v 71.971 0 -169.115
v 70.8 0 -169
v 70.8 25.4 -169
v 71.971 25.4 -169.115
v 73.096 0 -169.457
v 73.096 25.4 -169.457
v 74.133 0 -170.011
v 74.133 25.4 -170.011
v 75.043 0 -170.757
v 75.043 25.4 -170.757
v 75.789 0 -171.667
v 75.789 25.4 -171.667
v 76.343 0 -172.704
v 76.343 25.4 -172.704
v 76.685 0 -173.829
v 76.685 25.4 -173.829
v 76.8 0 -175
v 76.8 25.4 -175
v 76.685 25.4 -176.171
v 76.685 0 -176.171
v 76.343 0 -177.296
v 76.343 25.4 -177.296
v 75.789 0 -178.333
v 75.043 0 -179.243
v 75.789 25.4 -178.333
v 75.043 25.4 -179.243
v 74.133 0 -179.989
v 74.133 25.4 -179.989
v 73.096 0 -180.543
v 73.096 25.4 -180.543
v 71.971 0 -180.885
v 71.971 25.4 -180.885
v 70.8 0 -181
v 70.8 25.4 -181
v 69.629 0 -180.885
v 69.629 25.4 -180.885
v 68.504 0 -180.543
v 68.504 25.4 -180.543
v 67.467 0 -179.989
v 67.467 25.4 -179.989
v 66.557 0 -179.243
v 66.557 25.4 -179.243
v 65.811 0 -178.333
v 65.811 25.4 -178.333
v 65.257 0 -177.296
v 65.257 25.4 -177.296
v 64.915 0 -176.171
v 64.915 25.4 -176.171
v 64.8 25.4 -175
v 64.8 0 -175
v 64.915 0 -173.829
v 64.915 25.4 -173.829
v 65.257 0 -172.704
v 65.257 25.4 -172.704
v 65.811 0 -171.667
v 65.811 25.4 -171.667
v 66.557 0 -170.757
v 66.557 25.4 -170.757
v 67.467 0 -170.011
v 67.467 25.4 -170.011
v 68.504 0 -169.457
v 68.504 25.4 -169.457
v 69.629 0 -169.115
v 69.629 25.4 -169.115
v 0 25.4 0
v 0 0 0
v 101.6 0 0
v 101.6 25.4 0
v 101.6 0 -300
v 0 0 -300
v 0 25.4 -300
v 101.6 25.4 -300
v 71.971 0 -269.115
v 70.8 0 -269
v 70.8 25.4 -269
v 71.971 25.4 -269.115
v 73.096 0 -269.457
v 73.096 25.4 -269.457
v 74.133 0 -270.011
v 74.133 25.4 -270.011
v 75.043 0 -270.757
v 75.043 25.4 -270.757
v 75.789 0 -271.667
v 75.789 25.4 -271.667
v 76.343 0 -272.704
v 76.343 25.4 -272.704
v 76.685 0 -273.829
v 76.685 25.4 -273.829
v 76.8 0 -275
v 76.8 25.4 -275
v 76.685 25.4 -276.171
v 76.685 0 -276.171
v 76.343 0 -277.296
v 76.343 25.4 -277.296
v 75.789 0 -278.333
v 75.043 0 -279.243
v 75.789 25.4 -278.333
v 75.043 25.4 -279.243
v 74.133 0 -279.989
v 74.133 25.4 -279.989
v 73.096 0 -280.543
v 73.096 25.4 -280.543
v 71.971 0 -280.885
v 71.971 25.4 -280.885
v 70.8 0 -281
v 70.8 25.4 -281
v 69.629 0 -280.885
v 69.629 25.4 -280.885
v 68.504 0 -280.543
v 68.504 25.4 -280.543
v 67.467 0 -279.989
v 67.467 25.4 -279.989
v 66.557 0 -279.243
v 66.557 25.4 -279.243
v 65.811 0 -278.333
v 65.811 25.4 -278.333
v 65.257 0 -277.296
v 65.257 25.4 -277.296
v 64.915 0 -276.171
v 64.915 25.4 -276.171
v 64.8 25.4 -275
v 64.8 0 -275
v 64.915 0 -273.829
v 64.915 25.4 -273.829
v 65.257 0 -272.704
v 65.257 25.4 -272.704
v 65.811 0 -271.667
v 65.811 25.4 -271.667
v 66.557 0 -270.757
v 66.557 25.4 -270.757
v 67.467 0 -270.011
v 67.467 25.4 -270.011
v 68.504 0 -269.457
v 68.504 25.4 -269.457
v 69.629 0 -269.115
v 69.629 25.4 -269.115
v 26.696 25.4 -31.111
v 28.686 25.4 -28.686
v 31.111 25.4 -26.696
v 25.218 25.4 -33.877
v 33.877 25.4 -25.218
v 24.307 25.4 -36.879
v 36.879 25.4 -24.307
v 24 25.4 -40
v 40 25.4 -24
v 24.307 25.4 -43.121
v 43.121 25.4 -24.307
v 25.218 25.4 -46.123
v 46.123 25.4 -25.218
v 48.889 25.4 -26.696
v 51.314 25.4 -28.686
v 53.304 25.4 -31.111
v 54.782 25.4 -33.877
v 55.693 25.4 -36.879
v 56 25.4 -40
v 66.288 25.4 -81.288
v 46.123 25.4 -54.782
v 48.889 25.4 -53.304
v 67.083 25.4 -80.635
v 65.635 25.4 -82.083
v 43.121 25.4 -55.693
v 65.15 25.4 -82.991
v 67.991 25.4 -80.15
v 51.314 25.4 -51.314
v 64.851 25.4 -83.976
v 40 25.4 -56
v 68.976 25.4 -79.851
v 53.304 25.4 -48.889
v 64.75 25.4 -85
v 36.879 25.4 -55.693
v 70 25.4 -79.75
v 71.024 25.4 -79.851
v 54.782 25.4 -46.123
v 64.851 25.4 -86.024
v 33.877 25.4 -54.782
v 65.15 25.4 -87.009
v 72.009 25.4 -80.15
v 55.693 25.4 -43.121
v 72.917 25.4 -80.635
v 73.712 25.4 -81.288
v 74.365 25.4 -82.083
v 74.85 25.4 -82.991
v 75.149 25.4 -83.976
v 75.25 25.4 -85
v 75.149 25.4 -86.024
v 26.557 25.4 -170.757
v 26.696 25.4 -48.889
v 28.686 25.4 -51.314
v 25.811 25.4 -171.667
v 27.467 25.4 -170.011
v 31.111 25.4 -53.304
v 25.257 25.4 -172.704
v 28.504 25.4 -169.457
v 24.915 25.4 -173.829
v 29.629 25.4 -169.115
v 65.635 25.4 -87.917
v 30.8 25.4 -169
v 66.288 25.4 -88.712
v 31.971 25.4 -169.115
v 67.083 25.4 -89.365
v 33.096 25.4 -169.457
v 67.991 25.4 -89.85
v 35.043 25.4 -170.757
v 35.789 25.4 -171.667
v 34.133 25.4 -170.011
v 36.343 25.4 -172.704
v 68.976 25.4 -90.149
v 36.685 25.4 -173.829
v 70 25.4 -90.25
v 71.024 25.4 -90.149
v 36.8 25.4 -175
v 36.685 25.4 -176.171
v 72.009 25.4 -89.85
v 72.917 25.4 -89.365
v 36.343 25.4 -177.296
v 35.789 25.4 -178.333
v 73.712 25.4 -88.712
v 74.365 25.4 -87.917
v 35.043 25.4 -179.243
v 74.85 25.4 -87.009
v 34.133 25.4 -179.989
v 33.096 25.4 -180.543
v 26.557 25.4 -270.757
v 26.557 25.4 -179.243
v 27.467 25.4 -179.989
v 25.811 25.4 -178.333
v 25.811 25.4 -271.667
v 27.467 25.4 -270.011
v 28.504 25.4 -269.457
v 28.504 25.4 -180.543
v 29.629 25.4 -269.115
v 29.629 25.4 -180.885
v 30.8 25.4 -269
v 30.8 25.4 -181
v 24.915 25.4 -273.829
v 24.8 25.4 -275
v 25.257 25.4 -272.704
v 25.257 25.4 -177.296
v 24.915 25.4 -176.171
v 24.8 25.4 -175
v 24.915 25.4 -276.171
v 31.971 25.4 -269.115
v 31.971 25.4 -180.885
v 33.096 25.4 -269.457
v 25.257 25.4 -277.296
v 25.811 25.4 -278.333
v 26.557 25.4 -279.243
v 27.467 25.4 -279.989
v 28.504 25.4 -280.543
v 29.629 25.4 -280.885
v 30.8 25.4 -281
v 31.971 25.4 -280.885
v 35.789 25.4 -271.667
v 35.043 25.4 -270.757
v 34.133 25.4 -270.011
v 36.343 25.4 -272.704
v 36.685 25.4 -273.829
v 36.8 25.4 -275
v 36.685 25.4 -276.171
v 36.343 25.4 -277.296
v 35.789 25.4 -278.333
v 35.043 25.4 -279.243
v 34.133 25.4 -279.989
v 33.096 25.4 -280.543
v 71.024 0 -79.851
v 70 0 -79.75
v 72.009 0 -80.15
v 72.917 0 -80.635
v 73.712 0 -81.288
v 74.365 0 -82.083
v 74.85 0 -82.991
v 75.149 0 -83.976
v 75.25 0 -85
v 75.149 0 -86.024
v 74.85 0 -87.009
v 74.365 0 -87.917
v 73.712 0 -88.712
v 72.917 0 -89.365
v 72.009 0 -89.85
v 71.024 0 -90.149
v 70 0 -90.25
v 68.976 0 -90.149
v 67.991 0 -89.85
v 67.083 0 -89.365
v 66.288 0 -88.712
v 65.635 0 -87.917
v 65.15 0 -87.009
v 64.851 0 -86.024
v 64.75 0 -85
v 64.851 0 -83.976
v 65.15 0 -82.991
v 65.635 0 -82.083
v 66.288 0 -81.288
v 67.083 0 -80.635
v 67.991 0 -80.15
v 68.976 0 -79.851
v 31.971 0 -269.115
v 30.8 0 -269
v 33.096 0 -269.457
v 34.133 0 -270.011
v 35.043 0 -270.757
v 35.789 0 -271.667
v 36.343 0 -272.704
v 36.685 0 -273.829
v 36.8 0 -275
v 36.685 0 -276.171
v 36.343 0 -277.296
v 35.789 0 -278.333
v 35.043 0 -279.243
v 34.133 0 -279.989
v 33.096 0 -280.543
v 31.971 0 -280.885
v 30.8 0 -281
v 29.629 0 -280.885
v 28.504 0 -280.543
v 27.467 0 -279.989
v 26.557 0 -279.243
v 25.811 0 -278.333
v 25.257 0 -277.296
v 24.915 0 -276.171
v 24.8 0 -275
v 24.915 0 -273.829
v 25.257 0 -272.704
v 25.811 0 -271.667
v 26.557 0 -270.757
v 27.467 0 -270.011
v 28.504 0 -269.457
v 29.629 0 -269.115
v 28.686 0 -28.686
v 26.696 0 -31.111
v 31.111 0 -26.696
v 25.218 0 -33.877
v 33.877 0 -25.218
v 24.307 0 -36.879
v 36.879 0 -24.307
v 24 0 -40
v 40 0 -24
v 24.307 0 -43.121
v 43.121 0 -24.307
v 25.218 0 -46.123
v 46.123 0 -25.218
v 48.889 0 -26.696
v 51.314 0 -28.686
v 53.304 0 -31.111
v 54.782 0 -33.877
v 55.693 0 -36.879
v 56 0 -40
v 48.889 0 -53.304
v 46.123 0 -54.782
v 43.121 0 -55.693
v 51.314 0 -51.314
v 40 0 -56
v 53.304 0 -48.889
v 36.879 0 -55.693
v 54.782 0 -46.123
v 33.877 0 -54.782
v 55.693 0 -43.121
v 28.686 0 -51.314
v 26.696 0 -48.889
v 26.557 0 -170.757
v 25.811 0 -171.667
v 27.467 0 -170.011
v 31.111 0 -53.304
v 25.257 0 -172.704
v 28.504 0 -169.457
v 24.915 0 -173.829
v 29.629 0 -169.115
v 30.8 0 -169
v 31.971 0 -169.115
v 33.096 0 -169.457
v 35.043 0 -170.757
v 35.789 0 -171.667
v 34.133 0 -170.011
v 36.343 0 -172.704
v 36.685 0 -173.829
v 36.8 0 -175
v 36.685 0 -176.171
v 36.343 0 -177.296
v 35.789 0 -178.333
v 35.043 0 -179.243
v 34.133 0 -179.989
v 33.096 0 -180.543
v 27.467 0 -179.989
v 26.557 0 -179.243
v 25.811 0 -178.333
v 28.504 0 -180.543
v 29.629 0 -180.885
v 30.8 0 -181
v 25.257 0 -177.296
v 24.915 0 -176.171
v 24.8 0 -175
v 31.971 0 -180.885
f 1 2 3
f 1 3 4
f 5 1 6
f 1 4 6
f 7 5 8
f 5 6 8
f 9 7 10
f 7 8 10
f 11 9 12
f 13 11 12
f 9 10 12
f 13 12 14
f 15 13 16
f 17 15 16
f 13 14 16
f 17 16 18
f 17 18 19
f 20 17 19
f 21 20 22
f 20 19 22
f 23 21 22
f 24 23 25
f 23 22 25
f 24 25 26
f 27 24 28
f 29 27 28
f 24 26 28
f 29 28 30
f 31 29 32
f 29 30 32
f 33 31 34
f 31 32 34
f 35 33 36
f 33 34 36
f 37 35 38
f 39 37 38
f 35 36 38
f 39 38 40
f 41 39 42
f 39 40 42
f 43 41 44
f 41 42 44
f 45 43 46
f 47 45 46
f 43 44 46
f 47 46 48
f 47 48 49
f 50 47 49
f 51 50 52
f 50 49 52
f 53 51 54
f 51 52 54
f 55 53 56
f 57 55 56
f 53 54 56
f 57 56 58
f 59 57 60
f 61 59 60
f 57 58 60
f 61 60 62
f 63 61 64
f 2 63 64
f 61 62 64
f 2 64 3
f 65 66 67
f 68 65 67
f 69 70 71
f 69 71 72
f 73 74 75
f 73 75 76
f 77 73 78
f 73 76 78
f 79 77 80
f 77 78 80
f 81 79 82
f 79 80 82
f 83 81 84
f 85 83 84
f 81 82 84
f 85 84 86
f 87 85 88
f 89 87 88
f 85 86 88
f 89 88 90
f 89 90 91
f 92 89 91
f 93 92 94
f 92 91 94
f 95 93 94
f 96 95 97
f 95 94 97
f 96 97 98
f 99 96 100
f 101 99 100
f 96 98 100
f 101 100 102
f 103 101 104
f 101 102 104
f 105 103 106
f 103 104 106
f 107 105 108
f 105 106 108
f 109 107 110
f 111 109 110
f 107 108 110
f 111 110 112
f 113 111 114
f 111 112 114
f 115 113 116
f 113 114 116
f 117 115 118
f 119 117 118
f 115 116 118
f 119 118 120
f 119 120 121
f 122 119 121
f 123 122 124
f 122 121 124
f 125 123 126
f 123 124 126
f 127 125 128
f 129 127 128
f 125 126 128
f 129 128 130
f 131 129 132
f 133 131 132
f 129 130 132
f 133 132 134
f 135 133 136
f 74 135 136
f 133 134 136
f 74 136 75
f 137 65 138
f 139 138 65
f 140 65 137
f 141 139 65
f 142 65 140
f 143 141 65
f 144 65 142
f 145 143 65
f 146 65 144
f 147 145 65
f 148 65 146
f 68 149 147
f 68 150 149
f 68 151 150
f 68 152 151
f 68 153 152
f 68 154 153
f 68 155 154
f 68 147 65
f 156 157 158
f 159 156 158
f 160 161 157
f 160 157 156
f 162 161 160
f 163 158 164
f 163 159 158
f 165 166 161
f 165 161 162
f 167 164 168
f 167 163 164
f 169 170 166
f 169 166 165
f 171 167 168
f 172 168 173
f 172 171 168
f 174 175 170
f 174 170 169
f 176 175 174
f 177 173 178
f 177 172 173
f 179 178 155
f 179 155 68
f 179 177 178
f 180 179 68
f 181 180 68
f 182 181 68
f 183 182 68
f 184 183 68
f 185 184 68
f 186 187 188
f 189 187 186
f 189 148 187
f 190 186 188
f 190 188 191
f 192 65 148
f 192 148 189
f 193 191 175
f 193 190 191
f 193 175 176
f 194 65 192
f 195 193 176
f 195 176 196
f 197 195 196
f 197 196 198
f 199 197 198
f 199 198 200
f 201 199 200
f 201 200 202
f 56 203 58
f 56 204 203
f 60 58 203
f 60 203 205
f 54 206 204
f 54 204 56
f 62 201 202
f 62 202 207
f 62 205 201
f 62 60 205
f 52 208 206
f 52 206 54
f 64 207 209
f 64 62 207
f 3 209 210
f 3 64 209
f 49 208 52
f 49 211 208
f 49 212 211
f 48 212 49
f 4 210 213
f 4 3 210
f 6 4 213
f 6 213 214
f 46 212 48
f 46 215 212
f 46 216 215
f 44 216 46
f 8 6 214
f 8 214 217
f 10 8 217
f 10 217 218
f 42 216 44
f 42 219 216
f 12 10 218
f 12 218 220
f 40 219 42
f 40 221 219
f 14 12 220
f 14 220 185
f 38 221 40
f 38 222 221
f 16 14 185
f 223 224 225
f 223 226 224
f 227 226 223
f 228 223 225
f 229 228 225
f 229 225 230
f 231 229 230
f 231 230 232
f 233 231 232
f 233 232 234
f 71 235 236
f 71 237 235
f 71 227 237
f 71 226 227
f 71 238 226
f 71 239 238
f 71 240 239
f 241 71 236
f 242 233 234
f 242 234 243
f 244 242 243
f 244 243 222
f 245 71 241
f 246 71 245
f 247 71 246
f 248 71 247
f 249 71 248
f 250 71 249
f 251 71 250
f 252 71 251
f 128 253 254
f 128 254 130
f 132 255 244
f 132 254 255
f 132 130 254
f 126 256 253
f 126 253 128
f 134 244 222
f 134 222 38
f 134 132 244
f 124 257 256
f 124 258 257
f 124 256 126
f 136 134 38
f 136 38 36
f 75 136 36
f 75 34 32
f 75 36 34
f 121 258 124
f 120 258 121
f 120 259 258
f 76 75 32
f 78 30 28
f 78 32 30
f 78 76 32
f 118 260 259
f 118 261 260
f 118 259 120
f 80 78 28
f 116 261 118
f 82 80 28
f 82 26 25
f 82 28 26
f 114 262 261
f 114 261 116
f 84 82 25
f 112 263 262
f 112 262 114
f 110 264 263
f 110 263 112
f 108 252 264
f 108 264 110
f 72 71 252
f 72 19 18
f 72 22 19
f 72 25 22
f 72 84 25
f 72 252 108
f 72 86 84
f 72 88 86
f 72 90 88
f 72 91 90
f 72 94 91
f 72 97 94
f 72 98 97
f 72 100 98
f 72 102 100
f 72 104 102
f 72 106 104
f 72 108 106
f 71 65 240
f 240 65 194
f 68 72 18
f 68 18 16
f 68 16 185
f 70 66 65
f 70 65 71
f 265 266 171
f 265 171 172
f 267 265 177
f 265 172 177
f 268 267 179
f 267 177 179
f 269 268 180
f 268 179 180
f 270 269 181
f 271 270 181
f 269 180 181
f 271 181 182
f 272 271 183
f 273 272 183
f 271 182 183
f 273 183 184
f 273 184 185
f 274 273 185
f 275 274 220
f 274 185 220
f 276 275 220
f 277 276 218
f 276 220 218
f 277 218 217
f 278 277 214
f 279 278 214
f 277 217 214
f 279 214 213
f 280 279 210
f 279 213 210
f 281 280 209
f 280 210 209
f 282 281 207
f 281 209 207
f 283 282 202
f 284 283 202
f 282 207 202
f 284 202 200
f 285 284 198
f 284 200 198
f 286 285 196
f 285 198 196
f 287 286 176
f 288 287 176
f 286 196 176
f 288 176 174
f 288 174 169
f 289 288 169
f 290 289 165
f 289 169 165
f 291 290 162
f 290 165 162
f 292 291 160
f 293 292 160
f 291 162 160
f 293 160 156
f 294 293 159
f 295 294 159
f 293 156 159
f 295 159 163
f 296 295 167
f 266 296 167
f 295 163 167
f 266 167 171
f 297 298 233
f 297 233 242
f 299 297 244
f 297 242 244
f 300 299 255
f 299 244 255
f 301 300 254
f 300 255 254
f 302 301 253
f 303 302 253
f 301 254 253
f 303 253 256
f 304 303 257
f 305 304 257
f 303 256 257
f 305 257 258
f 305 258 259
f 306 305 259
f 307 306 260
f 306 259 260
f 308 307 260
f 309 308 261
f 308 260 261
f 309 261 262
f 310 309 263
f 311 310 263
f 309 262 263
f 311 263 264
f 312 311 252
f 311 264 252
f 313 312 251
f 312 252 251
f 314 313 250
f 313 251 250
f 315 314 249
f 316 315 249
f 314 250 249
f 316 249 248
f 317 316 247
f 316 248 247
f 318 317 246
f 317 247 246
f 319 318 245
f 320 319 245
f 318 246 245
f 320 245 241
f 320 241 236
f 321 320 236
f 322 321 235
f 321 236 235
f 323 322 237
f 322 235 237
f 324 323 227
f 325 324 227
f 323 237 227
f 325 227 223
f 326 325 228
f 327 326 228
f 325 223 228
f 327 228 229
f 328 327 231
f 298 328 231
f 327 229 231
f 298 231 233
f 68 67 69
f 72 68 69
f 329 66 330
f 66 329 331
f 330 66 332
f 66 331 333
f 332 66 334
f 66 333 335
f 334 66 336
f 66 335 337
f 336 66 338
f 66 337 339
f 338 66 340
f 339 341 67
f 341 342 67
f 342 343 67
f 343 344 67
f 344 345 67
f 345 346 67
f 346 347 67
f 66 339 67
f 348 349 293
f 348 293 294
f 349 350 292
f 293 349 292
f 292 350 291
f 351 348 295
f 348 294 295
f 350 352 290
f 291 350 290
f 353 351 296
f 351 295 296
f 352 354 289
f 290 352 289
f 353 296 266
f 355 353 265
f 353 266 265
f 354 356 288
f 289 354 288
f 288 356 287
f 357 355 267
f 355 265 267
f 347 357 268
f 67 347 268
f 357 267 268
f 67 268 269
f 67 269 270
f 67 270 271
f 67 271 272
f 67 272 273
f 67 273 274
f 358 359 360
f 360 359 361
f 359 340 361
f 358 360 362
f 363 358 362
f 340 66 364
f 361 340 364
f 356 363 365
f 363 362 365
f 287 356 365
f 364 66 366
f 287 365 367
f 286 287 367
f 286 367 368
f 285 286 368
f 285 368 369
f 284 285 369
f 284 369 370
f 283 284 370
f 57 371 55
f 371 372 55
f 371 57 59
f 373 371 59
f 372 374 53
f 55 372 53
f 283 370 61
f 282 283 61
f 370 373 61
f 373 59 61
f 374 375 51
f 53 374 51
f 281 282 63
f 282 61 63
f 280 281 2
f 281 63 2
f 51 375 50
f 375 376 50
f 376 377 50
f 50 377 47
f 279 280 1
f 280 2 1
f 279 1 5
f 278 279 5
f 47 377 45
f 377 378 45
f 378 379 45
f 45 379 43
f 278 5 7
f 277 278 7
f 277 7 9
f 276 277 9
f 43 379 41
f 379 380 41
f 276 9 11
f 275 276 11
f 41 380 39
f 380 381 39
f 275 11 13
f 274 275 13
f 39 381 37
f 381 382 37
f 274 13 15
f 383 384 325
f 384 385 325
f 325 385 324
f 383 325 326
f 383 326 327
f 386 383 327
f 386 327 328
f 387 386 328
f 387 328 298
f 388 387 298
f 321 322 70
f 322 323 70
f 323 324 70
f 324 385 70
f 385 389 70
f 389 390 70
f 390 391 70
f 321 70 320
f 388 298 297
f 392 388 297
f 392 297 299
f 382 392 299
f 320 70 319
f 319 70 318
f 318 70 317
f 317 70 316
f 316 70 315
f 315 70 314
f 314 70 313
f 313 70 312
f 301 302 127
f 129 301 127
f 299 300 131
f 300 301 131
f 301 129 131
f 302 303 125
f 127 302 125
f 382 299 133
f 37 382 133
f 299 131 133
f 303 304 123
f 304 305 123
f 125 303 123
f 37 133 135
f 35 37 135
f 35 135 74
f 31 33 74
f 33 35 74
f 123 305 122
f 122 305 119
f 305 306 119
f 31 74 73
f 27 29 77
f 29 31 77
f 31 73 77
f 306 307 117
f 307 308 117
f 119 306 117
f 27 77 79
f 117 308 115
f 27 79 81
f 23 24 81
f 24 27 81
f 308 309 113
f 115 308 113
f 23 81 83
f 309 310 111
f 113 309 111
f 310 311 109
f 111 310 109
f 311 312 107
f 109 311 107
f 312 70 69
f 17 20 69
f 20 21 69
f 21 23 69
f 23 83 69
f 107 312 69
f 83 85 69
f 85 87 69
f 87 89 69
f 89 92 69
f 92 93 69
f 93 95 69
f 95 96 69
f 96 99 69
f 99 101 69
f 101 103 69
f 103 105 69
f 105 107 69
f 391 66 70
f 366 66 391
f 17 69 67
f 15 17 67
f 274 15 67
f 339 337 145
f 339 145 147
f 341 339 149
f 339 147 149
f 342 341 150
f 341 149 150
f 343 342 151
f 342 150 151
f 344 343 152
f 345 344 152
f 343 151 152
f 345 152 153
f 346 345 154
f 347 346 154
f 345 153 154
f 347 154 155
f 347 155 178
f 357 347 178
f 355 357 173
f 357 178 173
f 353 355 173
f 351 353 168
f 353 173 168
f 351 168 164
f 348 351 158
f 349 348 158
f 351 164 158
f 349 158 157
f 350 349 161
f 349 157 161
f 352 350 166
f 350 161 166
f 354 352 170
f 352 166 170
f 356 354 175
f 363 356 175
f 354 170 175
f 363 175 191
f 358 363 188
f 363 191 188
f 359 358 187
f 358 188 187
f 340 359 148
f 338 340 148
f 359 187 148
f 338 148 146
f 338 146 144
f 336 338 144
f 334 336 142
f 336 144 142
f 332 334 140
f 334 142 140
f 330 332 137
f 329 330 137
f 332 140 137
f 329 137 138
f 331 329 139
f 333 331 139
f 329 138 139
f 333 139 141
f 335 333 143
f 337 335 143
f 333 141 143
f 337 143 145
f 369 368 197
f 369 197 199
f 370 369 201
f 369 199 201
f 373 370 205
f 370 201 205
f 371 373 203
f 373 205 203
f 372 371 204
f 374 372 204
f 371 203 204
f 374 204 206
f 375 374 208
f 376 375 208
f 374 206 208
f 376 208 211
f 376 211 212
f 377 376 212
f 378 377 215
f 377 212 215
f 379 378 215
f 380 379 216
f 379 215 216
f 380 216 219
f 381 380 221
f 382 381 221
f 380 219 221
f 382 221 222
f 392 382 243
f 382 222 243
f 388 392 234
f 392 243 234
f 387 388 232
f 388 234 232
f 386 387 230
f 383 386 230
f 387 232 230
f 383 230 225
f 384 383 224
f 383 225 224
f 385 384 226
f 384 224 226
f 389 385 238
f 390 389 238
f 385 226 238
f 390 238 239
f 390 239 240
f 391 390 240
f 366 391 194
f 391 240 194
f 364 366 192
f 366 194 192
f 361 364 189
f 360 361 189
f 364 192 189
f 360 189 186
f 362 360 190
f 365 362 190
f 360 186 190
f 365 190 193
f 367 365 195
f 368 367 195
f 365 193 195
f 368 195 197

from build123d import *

# Parameters (mm, degrees)
SKETCH2_W           = 101.6
SKETCH2_H           = 300
BOSS_EXTRUDE1_DEPTH = 25.4
SKETCH3_R           = 6
CUT_EXTRUDE1_DEPTH  = 25.4
SKETCH4_R           = 16
CUT_EXTRUDE2_DEPTH  = 25.4
SKETCH5_R           = 5.25
CUT_EXTRUDE3_DEPTH  = 25.4


with BuildPart() as part:
    # Sketch2 → Boss-Extrude1 (new body)
    with BuildSketch(Plane(origin=(0, 0, 0), x_dir=(1, 0, 0), z_dir=(0, 1, 0))):
        with Locations((50.8, 150)):
            Rectangle(SKETCH2_W, SKETCH2_H)
    extrude(amount=BOSS_EXTRUDE1_DEPTH)

    # Sketch3 → Cut-Extrude1 (cut)
    with BuildSketch(Plane(origin=(0, 25.4, 0), x_dir=(1, 0, 0), z_dir=(0, 1, 0))):
        with Locations(Location((70.8, 275, 0), (0, 0, 270))):
            Circle(SKETCH3_R)
        with Locations(Location((30.8, 275, 0), (0, 0, 270))):
            Circle(SKETCH3_R)
        with Locations(Location((30.8, 175, 0), (0, 0, 270))):
            Circle(SKETCH3_R)
        with Locations(Location((70.8, 175, 0), (0, 0, 270))):
            Circle(SKETCH3_R)
    extrude(amount=-CUT_EXTRUDE1_DEPTH, mode=Mode.SUBTRACT)

    # Sketch4 → Cut-Extrude2 (cut)
    with BuildSketch(Plane(origin=(0, 25.4, 0), x_dir=(1, 0, 0), z_dir=(0, 1, 0))):
        with Locations(Location((40, 40, 0), (0, 0, 270))):
            Circle(SKETCH4_R)
    extrude(amount=-CUT_EXTRUDE2_DEPTH, mode=Mode.SUBTRACT)

    # Sketch5 → Cut-Extrude3 (cut)
    with BuildSketch(Plane(origin=(0, 25.4, 0), x_dir=(1, 0, 0), z_dir=(0, 1, 0))):
        with Locations(Location((70, 85, 0), (0, 0, 270))):
            Circle(SKETCH5_R)
    extrude(amount=-CUT_EXTRUDE3_DEPTH, mode=Mode.SUBTRACT)


solid = part.part
